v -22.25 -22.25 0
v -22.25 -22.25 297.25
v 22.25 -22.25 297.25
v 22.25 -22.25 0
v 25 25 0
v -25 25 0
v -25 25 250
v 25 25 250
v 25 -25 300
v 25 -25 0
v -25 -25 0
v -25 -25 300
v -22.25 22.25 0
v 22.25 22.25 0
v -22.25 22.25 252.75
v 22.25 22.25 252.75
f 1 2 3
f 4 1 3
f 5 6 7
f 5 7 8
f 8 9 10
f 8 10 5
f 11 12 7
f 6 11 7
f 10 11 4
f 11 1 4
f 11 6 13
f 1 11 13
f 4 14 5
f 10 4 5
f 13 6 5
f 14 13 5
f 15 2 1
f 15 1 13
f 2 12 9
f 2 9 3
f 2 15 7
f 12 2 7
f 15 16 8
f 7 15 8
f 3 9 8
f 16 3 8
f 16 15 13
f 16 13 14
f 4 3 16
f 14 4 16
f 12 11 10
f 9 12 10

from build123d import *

# Parameters (mm, degrees)
F0_W     = 50
F0_H     = 50
F0_W_2   = 44.5
F0_H_2   = 44.5
F1_DEPTH = 300
F3_DEPTH = 30


with BuildPart() as f1:
    # F0 (on Top) → F1 (new body)
    with BuildSketch(Plane.XY):
        Rectangle(F0_W, F0_H)
        Rectangle(F0_W_2, F0_H_2, mode=Mode.SUBTRACT)
    extrude(amount=F1_DEPTH)

    # F2 (on Right) → F3 (cut, symmetric)
    with BuildSketch(Plane.YZ):
        Polygon((25, 300), (-25, 300), (25, 250), align=None)
    extrude(amount=F3_DEPTH, both=True, mode=Mode.SUBTRACT)


solid = f1.part
